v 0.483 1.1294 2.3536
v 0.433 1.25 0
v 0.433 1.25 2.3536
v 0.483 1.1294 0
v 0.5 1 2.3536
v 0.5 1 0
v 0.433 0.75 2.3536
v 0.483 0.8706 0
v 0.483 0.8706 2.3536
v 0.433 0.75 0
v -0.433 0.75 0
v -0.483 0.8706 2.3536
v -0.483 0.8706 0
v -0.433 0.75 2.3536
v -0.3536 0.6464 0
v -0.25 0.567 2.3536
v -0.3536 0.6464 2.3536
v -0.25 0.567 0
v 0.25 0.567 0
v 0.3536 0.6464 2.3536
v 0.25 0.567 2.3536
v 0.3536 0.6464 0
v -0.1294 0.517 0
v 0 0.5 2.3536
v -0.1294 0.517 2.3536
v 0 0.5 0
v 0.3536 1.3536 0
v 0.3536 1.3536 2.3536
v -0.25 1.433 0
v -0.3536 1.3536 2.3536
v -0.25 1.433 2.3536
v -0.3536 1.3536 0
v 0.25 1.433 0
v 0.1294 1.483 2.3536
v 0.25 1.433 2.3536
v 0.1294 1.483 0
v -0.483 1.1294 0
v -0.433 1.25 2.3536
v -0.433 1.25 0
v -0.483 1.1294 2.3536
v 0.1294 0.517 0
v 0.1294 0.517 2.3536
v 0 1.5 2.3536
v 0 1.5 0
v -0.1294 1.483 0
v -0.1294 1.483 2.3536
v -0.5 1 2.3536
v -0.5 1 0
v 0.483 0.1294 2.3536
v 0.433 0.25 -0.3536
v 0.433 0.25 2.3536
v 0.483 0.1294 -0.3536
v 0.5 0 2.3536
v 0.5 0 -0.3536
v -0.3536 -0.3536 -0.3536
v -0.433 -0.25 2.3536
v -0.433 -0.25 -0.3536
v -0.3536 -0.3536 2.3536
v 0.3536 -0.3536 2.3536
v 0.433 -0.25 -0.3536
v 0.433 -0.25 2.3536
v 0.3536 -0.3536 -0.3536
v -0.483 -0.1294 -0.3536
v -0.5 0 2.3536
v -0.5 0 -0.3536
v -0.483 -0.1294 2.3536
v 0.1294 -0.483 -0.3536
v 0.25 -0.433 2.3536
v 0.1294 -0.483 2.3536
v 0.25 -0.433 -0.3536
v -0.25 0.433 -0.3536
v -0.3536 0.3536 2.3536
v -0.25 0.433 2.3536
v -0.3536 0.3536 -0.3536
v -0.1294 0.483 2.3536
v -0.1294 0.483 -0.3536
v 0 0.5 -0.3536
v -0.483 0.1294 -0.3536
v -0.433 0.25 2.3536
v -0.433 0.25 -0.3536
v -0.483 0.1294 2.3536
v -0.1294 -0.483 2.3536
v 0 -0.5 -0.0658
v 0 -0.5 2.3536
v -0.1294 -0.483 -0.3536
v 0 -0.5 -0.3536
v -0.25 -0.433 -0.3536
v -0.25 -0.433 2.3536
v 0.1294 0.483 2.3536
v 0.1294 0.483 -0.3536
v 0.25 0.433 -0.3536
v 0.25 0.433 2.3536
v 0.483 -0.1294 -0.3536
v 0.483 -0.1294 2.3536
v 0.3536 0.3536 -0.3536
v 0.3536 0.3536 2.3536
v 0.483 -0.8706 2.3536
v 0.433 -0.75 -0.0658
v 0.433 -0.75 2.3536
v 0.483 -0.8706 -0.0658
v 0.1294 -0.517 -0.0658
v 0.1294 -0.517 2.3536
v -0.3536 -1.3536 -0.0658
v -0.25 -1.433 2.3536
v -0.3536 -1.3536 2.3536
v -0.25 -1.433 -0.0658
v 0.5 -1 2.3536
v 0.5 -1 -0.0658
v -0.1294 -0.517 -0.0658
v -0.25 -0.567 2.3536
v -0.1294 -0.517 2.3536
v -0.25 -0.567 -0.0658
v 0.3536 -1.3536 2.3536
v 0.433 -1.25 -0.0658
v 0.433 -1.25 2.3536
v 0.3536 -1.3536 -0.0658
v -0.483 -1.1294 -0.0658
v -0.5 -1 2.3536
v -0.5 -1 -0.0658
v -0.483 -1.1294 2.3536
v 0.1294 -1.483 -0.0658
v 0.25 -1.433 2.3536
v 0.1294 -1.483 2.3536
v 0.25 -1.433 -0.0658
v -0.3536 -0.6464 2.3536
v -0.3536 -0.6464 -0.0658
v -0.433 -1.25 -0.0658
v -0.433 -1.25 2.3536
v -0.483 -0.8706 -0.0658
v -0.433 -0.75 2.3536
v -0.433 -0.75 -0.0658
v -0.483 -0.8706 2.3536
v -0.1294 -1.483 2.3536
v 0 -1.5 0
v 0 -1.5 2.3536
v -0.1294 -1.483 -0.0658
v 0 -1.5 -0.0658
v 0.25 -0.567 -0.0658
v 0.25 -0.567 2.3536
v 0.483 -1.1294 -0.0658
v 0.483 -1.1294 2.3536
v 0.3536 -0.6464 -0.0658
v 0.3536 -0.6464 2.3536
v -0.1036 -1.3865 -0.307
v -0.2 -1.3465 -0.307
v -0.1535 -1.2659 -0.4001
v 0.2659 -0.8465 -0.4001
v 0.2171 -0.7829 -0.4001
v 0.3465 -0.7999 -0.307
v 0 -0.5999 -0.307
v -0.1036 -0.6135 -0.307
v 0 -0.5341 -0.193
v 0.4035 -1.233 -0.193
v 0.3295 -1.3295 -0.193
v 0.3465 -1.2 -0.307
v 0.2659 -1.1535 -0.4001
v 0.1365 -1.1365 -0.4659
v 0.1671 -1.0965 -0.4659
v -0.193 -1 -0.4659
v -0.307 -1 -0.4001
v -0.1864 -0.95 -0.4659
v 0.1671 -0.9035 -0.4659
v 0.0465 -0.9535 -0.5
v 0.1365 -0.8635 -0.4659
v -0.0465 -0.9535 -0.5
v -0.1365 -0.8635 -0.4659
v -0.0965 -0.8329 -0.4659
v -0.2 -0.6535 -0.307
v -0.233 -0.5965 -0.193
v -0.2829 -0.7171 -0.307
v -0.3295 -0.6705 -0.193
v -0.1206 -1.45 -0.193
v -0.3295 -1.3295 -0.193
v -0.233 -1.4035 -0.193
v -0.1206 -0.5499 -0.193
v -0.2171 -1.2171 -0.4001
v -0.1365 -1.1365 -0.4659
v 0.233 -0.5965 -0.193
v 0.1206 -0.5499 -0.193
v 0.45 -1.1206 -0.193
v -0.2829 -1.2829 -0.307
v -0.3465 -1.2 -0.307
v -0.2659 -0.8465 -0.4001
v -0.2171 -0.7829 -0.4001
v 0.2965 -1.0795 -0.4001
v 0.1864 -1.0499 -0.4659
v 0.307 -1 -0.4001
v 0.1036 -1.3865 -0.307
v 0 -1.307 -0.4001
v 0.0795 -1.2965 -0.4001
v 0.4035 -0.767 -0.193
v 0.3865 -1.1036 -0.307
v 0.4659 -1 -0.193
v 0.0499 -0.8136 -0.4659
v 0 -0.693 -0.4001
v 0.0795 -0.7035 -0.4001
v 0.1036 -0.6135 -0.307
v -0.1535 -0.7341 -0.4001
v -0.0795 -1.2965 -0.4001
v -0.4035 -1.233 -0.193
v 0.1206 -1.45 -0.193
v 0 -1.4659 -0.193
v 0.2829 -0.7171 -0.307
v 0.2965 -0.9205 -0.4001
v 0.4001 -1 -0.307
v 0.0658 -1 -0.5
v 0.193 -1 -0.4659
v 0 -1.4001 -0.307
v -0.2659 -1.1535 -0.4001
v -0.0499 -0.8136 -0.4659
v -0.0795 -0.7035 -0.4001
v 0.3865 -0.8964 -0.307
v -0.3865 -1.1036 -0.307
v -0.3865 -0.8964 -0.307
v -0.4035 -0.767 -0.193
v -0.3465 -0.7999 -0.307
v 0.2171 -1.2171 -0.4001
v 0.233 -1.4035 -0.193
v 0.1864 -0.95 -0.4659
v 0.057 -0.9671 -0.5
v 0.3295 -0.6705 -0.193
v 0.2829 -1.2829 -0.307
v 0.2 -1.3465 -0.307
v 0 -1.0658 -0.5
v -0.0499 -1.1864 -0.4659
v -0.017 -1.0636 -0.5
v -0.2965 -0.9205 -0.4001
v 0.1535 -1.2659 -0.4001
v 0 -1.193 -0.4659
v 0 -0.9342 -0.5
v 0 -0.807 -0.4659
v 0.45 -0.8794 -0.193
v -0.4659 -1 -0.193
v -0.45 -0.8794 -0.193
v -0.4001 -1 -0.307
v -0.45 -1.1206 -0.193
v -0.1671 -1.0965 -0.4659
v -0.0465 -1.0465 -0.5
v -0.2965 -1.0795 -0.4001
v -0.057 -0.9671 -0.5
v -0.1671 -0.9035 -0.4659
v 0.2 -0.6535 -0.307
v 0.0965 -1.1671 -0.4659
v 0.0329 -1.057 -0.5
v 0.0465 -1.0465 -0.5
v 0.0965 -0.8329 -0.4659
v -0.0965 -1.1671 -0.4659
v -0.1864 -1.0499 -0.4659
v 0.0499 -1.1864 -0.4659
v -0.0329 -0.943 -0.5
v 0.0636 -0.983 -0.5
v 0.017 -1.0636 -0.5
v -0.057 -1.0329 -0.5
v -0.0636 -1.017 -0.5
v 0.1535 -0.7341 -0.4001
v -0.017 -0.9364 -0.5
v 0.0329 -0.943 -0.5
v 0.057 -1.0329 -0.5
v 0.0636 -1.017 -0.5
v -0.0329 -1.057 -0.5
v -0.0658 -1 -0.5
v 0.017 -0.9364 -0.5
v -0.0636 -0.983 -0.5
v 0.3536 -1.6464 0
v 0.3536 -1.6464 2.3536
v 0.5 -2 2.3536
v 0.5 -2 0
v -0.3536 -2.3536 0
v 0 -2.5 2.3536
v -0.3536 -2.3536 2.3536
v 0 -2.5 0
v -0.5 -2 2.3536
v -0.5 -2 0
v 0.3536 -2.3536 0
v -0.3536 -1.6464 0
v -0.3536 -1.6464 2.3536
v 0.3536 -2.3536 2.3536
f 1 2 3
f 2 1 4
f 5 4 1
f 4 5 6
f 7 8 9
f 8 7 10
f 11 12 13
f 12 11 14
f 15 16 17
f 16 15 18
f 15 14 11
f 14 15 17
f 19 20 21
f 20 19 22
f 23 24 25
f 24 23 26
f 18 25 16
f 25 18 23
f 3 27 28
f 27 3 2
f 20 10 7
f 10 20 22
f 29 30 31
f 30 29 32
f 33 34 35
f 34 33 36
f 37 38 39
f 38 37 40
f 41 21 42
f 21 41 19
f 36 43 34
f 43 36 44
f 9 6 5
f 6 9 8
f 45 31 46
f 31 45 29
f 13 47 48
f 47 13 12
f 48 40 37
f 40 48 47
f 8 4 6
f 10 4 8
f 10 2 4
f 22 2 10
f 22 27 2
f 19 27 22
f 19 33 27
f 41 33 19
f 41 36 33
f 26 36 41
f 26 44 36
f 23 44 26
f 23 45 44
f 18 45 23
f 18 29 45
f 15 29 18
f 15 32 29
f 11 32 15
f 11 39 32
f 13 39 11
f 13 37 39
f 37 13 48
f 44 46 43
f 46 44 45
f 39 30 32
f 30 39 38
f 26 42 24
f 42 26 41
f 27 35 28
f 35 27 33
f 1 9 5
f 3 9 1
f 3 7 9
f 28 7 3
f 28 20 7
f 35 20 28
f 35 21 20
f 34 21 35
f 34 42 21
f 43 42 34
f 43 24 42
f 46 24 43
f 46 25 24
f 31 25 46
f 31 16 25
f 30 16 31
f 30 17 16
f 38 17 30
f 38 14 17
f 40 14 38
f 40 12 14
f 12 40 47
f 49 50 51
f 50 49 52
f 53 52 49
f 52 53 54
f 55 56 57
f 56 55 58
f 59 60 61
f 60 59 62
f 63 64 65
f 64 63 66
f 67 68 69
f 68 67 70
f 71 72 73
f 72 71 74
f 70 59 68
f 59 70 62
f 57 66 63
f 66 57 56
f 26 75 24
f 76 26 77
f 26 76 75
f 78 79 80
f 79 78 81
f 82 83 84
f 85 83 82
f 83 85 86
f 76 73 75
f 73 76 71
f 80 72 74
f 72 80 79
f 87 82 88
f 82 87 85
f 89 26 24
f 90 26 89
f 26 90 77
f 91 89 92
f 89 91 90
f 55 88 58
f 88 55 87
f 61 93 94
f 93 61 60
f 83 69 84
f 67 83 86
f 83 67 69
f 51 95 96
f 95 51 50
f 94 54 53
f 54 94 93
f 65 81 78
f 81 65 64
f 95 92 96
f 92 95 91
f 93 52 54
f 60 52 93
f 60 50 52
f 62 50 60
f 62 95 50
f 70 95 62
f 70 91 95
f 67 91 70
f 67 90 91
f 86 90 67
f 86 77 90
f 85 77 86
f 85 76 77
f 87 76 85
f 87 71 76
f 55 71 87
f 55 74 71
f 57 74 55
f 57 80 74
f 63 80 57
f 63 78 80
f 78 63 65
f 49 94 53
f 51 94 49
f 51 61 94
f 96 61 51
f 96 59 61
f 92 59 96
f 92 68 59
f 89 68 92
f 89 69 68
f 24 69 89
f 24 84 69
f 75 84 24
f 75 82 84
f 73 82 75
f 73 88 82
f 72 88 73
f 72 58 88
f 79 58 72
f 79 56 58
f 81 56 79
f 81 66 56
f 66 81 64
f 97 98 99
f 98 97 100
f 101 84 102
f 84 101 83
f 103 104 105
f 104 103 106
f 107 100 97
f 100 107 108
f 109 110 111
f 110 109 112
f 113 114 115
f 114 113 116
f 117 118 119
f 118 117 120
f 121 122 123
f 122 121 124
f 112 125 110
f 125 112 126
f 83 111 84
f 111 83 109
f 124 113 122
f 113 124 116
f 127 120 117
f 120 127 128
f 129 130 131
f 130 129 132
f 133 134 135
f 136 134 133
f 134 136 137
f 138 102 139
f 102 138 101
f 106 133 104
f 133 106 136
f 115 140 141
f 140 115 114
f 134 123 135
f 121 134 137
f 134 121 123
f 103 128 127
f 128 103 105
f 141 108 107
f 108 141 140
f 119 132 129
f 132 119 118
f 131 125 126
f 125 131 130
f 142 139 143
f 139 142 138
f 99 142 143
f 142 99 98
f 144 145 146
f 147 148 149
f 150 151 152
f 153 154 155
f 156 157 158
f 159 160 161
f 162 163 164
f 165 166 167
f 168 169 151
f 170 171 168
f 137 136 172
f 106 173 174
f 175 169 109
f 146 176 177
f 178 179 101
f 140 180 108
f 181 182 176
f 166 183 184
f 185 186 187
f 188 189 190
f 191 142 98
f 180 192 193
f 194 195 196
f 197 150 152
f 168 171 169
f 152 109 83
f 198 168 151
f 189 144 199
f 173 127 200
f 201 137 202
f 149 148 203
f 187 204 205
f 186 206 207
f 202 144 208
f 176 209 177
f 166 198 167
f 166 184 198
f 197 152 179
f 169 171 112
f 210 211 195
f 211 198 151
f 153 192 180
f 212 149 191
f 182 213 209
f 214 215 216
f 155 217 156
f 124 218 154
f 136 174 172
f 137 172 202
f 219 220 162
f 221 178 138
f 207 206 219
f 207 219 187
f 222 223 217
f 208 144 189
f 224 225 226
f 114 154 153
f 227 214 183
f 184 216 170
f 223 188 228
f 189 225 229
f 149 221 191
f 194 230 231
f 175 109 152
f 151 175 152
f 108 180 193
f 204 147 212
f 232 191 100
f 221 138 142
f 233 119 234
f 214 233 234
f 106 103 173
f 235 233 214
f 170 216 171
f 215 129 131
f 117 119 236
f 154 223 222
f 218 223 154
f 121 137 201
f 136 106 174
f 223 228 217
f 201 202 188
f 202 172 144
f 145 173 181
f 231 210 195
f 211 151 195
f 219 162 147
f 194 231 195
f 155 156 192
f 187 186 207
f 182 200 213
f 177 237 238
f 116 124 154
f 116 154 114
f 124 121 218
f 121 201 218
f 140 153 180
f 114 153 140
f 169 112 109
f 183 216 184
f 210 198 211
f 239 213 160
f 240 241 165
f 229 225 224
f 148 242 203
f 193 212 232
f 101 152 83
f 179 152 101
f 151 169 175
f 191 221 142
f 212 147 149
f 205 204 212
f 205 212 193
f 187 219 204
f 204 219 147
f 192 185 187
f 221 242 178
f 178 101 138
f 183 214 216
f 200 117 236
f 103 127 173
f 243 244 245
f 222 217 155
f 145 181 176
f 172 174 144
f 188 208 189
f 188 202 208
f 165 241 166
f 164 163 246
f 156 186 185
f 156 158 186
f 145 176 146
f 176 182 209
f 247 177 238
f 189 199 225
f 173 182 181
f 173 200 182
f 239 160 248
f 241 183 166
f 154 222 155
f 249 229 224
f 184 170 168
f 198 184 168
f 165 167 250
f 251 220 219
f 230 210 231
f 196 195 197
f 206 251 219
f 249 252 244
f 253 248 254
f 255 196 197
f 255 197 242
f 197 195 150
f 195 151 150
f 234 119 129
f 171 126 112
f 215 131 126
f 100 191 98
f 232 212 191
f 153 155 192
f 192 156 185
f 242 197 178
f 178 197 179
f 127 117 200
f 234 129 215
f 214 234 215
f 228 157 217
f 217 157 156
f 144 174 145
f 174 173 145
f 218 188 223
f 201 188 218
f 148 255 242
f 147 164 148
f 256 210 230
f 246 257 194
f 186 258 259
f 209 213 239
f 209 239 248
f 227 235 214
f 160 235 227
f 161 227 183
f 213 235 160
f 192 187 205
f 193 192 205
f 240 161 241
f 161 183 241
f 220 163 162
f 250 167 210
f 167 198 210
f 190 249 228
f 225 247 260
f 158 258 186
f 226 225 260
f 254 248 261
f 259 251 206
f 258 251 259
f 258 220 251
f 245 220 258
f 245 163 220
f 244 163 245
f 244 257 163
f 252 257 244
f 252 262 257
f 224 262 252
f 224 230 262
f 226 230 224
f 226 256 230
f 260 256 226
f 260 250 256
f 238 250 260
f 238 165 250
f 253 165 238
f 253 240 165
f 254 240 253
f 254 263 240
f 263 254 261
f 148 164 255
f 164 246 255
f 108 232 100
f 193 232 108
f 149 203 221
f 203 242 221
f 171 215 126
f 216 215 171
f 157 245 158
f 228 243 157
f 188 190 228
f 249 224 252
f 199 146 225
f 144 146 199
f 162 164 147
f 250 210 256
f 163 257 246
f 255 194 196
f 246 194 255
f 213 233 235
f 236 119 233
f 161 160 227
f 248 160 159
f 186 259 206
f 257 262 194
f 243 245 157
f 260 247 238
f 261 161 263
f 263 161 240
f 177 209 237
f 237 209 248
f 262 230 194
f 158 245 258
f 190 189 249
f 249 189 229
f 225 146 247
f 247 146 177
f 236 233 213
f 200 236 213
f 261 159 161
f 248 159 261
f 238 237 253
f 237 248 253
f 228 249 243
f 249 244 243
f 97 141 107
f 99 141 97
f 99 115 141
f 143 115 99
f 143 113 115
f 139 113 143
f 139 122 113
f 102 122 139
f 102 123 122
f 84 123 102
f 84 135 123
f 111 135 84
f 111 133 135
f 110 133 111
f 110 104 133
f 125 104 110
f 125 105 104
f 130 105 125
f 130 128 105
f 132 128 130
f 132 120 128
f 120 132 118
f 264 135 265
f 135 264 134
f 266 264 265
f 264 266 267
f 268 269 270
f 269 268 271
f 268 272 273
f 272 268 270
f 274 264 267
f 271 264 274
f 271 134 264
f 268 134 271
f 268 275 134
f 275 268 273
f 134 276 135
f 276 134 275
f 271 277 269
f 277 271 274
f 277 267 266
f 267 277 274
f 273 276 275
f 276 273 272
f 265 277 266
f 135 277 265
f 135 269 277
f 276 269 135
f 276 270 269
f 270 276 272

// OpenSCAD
/**
* line3d.scad
*
* @copyright Justin Lin, 2017
* @license https://opensource.org/licenses/lgpl-3.0.html
*
* @see https://openhome.cc/eGossip/OpenSCAD/lib3x-line3d.html
*

    p1 : 3 element vector [x, y, z].
    p2 : 3 element vector [x, y, z].
    diameter : The line diameter. Default to 1.
    p1Style : The end-cap style of the point p1. The value must be "CAP_BUTT", "CAP_CIRCLE" or "CAP_SPHERE". The default value is "CAP_CIRCLE".
    p2Style : The end-cap style of the point p2. The value must be "CAP_BUTT", "CAP_CIRCLE" or "CAP_SPHERE". The default value is "CAP_CIRCLE".
    $fa, $fs, $fn : Used by the circle or sphere module internally. Check the circle module or the sphere module for more details. The final fragments of a circle will be a multiple of 4 to fit edges.

**/

line3d([0,1,0],[0,1,2],1,p1Style="CAP_BUTT",$fn = 24); 
line3d([0,0,0],[0,0,2],1,p1Style="CAP_CIRCLE",$fn = 24);
line3d([0,-1,0],[0,-1,2],1,p1Style="CAP_SPHERE",$fn = 24);
line3d([0,-2,0],[0,-2,2],1,p1Style="CAP_BUTT",$fn = 6);

module line3d(p1, p2, diameter = 1, p1Style = "CAP_CIRCLE", p2Style = "CAP_CIRCLE") {
    r = diameter / 2;

    frags = __nearest_multiple_of_4(__frags(r));
    half_fa = 180 / frags;
    
    v = p2 - p1;
    length = norm(v);
    ay = 90 - atan2(v.z, norm([v.x, v.y]));
    az = atan2(v.y, v.x);

    angles = [0, ay, az];

    module cap_with(p) { 
        translate(p) 
        rotate(angles) 
            children();  
    } 

    module cap_butt() {
        cap_with(p1)                 
        linear_extrude(length) 
            circle(r, $fn = frags);
        
        // hook for testing
        test_line3d_butt(p1, r, frags, length, angles);
    }

    module cap(p, style) {
        if(style == "CAP_CIRCLE") {
            cap_leng = r / 1.414;
            cap_with(p) 
            linear_extrude(cap_leng * 2, center = true) 
                circle(r, $fn = frags);

            // hook for testing
            test_line3d_cap(p, r, frags, cap_leng, angles);
        } else if(style == "CAP_SPHERE") { 
            cap_leng = r / cos(half_fa);
            cap_with(p)
                sphere(cap_leng, $fn = frags);  
            
            // hook for testing
            test_line3d_cap(p, r, frags, cap_leng, angles);
        }            
    }


    cap_butt();
    cap(p1, p1Style);
    cap(p2, p2Style);
}

// Override them to test
module test_line3d_butt(p, r, frags, length, angles) {

}

module test_line3d_cap(p, r, frags, cap_leng, angles) {
    
}

function __frags(radius) = 
    $fn == 0 ?  
        max(min(360 / $fa, radius * 6.283185307179586 / $fs), 5) :
        max($fn, 3);
        
function __nearest_multiple_of_4(n) =
    let(remain = n % 4)
    remain > 1 ? n - remain + 4 : n - remain;
